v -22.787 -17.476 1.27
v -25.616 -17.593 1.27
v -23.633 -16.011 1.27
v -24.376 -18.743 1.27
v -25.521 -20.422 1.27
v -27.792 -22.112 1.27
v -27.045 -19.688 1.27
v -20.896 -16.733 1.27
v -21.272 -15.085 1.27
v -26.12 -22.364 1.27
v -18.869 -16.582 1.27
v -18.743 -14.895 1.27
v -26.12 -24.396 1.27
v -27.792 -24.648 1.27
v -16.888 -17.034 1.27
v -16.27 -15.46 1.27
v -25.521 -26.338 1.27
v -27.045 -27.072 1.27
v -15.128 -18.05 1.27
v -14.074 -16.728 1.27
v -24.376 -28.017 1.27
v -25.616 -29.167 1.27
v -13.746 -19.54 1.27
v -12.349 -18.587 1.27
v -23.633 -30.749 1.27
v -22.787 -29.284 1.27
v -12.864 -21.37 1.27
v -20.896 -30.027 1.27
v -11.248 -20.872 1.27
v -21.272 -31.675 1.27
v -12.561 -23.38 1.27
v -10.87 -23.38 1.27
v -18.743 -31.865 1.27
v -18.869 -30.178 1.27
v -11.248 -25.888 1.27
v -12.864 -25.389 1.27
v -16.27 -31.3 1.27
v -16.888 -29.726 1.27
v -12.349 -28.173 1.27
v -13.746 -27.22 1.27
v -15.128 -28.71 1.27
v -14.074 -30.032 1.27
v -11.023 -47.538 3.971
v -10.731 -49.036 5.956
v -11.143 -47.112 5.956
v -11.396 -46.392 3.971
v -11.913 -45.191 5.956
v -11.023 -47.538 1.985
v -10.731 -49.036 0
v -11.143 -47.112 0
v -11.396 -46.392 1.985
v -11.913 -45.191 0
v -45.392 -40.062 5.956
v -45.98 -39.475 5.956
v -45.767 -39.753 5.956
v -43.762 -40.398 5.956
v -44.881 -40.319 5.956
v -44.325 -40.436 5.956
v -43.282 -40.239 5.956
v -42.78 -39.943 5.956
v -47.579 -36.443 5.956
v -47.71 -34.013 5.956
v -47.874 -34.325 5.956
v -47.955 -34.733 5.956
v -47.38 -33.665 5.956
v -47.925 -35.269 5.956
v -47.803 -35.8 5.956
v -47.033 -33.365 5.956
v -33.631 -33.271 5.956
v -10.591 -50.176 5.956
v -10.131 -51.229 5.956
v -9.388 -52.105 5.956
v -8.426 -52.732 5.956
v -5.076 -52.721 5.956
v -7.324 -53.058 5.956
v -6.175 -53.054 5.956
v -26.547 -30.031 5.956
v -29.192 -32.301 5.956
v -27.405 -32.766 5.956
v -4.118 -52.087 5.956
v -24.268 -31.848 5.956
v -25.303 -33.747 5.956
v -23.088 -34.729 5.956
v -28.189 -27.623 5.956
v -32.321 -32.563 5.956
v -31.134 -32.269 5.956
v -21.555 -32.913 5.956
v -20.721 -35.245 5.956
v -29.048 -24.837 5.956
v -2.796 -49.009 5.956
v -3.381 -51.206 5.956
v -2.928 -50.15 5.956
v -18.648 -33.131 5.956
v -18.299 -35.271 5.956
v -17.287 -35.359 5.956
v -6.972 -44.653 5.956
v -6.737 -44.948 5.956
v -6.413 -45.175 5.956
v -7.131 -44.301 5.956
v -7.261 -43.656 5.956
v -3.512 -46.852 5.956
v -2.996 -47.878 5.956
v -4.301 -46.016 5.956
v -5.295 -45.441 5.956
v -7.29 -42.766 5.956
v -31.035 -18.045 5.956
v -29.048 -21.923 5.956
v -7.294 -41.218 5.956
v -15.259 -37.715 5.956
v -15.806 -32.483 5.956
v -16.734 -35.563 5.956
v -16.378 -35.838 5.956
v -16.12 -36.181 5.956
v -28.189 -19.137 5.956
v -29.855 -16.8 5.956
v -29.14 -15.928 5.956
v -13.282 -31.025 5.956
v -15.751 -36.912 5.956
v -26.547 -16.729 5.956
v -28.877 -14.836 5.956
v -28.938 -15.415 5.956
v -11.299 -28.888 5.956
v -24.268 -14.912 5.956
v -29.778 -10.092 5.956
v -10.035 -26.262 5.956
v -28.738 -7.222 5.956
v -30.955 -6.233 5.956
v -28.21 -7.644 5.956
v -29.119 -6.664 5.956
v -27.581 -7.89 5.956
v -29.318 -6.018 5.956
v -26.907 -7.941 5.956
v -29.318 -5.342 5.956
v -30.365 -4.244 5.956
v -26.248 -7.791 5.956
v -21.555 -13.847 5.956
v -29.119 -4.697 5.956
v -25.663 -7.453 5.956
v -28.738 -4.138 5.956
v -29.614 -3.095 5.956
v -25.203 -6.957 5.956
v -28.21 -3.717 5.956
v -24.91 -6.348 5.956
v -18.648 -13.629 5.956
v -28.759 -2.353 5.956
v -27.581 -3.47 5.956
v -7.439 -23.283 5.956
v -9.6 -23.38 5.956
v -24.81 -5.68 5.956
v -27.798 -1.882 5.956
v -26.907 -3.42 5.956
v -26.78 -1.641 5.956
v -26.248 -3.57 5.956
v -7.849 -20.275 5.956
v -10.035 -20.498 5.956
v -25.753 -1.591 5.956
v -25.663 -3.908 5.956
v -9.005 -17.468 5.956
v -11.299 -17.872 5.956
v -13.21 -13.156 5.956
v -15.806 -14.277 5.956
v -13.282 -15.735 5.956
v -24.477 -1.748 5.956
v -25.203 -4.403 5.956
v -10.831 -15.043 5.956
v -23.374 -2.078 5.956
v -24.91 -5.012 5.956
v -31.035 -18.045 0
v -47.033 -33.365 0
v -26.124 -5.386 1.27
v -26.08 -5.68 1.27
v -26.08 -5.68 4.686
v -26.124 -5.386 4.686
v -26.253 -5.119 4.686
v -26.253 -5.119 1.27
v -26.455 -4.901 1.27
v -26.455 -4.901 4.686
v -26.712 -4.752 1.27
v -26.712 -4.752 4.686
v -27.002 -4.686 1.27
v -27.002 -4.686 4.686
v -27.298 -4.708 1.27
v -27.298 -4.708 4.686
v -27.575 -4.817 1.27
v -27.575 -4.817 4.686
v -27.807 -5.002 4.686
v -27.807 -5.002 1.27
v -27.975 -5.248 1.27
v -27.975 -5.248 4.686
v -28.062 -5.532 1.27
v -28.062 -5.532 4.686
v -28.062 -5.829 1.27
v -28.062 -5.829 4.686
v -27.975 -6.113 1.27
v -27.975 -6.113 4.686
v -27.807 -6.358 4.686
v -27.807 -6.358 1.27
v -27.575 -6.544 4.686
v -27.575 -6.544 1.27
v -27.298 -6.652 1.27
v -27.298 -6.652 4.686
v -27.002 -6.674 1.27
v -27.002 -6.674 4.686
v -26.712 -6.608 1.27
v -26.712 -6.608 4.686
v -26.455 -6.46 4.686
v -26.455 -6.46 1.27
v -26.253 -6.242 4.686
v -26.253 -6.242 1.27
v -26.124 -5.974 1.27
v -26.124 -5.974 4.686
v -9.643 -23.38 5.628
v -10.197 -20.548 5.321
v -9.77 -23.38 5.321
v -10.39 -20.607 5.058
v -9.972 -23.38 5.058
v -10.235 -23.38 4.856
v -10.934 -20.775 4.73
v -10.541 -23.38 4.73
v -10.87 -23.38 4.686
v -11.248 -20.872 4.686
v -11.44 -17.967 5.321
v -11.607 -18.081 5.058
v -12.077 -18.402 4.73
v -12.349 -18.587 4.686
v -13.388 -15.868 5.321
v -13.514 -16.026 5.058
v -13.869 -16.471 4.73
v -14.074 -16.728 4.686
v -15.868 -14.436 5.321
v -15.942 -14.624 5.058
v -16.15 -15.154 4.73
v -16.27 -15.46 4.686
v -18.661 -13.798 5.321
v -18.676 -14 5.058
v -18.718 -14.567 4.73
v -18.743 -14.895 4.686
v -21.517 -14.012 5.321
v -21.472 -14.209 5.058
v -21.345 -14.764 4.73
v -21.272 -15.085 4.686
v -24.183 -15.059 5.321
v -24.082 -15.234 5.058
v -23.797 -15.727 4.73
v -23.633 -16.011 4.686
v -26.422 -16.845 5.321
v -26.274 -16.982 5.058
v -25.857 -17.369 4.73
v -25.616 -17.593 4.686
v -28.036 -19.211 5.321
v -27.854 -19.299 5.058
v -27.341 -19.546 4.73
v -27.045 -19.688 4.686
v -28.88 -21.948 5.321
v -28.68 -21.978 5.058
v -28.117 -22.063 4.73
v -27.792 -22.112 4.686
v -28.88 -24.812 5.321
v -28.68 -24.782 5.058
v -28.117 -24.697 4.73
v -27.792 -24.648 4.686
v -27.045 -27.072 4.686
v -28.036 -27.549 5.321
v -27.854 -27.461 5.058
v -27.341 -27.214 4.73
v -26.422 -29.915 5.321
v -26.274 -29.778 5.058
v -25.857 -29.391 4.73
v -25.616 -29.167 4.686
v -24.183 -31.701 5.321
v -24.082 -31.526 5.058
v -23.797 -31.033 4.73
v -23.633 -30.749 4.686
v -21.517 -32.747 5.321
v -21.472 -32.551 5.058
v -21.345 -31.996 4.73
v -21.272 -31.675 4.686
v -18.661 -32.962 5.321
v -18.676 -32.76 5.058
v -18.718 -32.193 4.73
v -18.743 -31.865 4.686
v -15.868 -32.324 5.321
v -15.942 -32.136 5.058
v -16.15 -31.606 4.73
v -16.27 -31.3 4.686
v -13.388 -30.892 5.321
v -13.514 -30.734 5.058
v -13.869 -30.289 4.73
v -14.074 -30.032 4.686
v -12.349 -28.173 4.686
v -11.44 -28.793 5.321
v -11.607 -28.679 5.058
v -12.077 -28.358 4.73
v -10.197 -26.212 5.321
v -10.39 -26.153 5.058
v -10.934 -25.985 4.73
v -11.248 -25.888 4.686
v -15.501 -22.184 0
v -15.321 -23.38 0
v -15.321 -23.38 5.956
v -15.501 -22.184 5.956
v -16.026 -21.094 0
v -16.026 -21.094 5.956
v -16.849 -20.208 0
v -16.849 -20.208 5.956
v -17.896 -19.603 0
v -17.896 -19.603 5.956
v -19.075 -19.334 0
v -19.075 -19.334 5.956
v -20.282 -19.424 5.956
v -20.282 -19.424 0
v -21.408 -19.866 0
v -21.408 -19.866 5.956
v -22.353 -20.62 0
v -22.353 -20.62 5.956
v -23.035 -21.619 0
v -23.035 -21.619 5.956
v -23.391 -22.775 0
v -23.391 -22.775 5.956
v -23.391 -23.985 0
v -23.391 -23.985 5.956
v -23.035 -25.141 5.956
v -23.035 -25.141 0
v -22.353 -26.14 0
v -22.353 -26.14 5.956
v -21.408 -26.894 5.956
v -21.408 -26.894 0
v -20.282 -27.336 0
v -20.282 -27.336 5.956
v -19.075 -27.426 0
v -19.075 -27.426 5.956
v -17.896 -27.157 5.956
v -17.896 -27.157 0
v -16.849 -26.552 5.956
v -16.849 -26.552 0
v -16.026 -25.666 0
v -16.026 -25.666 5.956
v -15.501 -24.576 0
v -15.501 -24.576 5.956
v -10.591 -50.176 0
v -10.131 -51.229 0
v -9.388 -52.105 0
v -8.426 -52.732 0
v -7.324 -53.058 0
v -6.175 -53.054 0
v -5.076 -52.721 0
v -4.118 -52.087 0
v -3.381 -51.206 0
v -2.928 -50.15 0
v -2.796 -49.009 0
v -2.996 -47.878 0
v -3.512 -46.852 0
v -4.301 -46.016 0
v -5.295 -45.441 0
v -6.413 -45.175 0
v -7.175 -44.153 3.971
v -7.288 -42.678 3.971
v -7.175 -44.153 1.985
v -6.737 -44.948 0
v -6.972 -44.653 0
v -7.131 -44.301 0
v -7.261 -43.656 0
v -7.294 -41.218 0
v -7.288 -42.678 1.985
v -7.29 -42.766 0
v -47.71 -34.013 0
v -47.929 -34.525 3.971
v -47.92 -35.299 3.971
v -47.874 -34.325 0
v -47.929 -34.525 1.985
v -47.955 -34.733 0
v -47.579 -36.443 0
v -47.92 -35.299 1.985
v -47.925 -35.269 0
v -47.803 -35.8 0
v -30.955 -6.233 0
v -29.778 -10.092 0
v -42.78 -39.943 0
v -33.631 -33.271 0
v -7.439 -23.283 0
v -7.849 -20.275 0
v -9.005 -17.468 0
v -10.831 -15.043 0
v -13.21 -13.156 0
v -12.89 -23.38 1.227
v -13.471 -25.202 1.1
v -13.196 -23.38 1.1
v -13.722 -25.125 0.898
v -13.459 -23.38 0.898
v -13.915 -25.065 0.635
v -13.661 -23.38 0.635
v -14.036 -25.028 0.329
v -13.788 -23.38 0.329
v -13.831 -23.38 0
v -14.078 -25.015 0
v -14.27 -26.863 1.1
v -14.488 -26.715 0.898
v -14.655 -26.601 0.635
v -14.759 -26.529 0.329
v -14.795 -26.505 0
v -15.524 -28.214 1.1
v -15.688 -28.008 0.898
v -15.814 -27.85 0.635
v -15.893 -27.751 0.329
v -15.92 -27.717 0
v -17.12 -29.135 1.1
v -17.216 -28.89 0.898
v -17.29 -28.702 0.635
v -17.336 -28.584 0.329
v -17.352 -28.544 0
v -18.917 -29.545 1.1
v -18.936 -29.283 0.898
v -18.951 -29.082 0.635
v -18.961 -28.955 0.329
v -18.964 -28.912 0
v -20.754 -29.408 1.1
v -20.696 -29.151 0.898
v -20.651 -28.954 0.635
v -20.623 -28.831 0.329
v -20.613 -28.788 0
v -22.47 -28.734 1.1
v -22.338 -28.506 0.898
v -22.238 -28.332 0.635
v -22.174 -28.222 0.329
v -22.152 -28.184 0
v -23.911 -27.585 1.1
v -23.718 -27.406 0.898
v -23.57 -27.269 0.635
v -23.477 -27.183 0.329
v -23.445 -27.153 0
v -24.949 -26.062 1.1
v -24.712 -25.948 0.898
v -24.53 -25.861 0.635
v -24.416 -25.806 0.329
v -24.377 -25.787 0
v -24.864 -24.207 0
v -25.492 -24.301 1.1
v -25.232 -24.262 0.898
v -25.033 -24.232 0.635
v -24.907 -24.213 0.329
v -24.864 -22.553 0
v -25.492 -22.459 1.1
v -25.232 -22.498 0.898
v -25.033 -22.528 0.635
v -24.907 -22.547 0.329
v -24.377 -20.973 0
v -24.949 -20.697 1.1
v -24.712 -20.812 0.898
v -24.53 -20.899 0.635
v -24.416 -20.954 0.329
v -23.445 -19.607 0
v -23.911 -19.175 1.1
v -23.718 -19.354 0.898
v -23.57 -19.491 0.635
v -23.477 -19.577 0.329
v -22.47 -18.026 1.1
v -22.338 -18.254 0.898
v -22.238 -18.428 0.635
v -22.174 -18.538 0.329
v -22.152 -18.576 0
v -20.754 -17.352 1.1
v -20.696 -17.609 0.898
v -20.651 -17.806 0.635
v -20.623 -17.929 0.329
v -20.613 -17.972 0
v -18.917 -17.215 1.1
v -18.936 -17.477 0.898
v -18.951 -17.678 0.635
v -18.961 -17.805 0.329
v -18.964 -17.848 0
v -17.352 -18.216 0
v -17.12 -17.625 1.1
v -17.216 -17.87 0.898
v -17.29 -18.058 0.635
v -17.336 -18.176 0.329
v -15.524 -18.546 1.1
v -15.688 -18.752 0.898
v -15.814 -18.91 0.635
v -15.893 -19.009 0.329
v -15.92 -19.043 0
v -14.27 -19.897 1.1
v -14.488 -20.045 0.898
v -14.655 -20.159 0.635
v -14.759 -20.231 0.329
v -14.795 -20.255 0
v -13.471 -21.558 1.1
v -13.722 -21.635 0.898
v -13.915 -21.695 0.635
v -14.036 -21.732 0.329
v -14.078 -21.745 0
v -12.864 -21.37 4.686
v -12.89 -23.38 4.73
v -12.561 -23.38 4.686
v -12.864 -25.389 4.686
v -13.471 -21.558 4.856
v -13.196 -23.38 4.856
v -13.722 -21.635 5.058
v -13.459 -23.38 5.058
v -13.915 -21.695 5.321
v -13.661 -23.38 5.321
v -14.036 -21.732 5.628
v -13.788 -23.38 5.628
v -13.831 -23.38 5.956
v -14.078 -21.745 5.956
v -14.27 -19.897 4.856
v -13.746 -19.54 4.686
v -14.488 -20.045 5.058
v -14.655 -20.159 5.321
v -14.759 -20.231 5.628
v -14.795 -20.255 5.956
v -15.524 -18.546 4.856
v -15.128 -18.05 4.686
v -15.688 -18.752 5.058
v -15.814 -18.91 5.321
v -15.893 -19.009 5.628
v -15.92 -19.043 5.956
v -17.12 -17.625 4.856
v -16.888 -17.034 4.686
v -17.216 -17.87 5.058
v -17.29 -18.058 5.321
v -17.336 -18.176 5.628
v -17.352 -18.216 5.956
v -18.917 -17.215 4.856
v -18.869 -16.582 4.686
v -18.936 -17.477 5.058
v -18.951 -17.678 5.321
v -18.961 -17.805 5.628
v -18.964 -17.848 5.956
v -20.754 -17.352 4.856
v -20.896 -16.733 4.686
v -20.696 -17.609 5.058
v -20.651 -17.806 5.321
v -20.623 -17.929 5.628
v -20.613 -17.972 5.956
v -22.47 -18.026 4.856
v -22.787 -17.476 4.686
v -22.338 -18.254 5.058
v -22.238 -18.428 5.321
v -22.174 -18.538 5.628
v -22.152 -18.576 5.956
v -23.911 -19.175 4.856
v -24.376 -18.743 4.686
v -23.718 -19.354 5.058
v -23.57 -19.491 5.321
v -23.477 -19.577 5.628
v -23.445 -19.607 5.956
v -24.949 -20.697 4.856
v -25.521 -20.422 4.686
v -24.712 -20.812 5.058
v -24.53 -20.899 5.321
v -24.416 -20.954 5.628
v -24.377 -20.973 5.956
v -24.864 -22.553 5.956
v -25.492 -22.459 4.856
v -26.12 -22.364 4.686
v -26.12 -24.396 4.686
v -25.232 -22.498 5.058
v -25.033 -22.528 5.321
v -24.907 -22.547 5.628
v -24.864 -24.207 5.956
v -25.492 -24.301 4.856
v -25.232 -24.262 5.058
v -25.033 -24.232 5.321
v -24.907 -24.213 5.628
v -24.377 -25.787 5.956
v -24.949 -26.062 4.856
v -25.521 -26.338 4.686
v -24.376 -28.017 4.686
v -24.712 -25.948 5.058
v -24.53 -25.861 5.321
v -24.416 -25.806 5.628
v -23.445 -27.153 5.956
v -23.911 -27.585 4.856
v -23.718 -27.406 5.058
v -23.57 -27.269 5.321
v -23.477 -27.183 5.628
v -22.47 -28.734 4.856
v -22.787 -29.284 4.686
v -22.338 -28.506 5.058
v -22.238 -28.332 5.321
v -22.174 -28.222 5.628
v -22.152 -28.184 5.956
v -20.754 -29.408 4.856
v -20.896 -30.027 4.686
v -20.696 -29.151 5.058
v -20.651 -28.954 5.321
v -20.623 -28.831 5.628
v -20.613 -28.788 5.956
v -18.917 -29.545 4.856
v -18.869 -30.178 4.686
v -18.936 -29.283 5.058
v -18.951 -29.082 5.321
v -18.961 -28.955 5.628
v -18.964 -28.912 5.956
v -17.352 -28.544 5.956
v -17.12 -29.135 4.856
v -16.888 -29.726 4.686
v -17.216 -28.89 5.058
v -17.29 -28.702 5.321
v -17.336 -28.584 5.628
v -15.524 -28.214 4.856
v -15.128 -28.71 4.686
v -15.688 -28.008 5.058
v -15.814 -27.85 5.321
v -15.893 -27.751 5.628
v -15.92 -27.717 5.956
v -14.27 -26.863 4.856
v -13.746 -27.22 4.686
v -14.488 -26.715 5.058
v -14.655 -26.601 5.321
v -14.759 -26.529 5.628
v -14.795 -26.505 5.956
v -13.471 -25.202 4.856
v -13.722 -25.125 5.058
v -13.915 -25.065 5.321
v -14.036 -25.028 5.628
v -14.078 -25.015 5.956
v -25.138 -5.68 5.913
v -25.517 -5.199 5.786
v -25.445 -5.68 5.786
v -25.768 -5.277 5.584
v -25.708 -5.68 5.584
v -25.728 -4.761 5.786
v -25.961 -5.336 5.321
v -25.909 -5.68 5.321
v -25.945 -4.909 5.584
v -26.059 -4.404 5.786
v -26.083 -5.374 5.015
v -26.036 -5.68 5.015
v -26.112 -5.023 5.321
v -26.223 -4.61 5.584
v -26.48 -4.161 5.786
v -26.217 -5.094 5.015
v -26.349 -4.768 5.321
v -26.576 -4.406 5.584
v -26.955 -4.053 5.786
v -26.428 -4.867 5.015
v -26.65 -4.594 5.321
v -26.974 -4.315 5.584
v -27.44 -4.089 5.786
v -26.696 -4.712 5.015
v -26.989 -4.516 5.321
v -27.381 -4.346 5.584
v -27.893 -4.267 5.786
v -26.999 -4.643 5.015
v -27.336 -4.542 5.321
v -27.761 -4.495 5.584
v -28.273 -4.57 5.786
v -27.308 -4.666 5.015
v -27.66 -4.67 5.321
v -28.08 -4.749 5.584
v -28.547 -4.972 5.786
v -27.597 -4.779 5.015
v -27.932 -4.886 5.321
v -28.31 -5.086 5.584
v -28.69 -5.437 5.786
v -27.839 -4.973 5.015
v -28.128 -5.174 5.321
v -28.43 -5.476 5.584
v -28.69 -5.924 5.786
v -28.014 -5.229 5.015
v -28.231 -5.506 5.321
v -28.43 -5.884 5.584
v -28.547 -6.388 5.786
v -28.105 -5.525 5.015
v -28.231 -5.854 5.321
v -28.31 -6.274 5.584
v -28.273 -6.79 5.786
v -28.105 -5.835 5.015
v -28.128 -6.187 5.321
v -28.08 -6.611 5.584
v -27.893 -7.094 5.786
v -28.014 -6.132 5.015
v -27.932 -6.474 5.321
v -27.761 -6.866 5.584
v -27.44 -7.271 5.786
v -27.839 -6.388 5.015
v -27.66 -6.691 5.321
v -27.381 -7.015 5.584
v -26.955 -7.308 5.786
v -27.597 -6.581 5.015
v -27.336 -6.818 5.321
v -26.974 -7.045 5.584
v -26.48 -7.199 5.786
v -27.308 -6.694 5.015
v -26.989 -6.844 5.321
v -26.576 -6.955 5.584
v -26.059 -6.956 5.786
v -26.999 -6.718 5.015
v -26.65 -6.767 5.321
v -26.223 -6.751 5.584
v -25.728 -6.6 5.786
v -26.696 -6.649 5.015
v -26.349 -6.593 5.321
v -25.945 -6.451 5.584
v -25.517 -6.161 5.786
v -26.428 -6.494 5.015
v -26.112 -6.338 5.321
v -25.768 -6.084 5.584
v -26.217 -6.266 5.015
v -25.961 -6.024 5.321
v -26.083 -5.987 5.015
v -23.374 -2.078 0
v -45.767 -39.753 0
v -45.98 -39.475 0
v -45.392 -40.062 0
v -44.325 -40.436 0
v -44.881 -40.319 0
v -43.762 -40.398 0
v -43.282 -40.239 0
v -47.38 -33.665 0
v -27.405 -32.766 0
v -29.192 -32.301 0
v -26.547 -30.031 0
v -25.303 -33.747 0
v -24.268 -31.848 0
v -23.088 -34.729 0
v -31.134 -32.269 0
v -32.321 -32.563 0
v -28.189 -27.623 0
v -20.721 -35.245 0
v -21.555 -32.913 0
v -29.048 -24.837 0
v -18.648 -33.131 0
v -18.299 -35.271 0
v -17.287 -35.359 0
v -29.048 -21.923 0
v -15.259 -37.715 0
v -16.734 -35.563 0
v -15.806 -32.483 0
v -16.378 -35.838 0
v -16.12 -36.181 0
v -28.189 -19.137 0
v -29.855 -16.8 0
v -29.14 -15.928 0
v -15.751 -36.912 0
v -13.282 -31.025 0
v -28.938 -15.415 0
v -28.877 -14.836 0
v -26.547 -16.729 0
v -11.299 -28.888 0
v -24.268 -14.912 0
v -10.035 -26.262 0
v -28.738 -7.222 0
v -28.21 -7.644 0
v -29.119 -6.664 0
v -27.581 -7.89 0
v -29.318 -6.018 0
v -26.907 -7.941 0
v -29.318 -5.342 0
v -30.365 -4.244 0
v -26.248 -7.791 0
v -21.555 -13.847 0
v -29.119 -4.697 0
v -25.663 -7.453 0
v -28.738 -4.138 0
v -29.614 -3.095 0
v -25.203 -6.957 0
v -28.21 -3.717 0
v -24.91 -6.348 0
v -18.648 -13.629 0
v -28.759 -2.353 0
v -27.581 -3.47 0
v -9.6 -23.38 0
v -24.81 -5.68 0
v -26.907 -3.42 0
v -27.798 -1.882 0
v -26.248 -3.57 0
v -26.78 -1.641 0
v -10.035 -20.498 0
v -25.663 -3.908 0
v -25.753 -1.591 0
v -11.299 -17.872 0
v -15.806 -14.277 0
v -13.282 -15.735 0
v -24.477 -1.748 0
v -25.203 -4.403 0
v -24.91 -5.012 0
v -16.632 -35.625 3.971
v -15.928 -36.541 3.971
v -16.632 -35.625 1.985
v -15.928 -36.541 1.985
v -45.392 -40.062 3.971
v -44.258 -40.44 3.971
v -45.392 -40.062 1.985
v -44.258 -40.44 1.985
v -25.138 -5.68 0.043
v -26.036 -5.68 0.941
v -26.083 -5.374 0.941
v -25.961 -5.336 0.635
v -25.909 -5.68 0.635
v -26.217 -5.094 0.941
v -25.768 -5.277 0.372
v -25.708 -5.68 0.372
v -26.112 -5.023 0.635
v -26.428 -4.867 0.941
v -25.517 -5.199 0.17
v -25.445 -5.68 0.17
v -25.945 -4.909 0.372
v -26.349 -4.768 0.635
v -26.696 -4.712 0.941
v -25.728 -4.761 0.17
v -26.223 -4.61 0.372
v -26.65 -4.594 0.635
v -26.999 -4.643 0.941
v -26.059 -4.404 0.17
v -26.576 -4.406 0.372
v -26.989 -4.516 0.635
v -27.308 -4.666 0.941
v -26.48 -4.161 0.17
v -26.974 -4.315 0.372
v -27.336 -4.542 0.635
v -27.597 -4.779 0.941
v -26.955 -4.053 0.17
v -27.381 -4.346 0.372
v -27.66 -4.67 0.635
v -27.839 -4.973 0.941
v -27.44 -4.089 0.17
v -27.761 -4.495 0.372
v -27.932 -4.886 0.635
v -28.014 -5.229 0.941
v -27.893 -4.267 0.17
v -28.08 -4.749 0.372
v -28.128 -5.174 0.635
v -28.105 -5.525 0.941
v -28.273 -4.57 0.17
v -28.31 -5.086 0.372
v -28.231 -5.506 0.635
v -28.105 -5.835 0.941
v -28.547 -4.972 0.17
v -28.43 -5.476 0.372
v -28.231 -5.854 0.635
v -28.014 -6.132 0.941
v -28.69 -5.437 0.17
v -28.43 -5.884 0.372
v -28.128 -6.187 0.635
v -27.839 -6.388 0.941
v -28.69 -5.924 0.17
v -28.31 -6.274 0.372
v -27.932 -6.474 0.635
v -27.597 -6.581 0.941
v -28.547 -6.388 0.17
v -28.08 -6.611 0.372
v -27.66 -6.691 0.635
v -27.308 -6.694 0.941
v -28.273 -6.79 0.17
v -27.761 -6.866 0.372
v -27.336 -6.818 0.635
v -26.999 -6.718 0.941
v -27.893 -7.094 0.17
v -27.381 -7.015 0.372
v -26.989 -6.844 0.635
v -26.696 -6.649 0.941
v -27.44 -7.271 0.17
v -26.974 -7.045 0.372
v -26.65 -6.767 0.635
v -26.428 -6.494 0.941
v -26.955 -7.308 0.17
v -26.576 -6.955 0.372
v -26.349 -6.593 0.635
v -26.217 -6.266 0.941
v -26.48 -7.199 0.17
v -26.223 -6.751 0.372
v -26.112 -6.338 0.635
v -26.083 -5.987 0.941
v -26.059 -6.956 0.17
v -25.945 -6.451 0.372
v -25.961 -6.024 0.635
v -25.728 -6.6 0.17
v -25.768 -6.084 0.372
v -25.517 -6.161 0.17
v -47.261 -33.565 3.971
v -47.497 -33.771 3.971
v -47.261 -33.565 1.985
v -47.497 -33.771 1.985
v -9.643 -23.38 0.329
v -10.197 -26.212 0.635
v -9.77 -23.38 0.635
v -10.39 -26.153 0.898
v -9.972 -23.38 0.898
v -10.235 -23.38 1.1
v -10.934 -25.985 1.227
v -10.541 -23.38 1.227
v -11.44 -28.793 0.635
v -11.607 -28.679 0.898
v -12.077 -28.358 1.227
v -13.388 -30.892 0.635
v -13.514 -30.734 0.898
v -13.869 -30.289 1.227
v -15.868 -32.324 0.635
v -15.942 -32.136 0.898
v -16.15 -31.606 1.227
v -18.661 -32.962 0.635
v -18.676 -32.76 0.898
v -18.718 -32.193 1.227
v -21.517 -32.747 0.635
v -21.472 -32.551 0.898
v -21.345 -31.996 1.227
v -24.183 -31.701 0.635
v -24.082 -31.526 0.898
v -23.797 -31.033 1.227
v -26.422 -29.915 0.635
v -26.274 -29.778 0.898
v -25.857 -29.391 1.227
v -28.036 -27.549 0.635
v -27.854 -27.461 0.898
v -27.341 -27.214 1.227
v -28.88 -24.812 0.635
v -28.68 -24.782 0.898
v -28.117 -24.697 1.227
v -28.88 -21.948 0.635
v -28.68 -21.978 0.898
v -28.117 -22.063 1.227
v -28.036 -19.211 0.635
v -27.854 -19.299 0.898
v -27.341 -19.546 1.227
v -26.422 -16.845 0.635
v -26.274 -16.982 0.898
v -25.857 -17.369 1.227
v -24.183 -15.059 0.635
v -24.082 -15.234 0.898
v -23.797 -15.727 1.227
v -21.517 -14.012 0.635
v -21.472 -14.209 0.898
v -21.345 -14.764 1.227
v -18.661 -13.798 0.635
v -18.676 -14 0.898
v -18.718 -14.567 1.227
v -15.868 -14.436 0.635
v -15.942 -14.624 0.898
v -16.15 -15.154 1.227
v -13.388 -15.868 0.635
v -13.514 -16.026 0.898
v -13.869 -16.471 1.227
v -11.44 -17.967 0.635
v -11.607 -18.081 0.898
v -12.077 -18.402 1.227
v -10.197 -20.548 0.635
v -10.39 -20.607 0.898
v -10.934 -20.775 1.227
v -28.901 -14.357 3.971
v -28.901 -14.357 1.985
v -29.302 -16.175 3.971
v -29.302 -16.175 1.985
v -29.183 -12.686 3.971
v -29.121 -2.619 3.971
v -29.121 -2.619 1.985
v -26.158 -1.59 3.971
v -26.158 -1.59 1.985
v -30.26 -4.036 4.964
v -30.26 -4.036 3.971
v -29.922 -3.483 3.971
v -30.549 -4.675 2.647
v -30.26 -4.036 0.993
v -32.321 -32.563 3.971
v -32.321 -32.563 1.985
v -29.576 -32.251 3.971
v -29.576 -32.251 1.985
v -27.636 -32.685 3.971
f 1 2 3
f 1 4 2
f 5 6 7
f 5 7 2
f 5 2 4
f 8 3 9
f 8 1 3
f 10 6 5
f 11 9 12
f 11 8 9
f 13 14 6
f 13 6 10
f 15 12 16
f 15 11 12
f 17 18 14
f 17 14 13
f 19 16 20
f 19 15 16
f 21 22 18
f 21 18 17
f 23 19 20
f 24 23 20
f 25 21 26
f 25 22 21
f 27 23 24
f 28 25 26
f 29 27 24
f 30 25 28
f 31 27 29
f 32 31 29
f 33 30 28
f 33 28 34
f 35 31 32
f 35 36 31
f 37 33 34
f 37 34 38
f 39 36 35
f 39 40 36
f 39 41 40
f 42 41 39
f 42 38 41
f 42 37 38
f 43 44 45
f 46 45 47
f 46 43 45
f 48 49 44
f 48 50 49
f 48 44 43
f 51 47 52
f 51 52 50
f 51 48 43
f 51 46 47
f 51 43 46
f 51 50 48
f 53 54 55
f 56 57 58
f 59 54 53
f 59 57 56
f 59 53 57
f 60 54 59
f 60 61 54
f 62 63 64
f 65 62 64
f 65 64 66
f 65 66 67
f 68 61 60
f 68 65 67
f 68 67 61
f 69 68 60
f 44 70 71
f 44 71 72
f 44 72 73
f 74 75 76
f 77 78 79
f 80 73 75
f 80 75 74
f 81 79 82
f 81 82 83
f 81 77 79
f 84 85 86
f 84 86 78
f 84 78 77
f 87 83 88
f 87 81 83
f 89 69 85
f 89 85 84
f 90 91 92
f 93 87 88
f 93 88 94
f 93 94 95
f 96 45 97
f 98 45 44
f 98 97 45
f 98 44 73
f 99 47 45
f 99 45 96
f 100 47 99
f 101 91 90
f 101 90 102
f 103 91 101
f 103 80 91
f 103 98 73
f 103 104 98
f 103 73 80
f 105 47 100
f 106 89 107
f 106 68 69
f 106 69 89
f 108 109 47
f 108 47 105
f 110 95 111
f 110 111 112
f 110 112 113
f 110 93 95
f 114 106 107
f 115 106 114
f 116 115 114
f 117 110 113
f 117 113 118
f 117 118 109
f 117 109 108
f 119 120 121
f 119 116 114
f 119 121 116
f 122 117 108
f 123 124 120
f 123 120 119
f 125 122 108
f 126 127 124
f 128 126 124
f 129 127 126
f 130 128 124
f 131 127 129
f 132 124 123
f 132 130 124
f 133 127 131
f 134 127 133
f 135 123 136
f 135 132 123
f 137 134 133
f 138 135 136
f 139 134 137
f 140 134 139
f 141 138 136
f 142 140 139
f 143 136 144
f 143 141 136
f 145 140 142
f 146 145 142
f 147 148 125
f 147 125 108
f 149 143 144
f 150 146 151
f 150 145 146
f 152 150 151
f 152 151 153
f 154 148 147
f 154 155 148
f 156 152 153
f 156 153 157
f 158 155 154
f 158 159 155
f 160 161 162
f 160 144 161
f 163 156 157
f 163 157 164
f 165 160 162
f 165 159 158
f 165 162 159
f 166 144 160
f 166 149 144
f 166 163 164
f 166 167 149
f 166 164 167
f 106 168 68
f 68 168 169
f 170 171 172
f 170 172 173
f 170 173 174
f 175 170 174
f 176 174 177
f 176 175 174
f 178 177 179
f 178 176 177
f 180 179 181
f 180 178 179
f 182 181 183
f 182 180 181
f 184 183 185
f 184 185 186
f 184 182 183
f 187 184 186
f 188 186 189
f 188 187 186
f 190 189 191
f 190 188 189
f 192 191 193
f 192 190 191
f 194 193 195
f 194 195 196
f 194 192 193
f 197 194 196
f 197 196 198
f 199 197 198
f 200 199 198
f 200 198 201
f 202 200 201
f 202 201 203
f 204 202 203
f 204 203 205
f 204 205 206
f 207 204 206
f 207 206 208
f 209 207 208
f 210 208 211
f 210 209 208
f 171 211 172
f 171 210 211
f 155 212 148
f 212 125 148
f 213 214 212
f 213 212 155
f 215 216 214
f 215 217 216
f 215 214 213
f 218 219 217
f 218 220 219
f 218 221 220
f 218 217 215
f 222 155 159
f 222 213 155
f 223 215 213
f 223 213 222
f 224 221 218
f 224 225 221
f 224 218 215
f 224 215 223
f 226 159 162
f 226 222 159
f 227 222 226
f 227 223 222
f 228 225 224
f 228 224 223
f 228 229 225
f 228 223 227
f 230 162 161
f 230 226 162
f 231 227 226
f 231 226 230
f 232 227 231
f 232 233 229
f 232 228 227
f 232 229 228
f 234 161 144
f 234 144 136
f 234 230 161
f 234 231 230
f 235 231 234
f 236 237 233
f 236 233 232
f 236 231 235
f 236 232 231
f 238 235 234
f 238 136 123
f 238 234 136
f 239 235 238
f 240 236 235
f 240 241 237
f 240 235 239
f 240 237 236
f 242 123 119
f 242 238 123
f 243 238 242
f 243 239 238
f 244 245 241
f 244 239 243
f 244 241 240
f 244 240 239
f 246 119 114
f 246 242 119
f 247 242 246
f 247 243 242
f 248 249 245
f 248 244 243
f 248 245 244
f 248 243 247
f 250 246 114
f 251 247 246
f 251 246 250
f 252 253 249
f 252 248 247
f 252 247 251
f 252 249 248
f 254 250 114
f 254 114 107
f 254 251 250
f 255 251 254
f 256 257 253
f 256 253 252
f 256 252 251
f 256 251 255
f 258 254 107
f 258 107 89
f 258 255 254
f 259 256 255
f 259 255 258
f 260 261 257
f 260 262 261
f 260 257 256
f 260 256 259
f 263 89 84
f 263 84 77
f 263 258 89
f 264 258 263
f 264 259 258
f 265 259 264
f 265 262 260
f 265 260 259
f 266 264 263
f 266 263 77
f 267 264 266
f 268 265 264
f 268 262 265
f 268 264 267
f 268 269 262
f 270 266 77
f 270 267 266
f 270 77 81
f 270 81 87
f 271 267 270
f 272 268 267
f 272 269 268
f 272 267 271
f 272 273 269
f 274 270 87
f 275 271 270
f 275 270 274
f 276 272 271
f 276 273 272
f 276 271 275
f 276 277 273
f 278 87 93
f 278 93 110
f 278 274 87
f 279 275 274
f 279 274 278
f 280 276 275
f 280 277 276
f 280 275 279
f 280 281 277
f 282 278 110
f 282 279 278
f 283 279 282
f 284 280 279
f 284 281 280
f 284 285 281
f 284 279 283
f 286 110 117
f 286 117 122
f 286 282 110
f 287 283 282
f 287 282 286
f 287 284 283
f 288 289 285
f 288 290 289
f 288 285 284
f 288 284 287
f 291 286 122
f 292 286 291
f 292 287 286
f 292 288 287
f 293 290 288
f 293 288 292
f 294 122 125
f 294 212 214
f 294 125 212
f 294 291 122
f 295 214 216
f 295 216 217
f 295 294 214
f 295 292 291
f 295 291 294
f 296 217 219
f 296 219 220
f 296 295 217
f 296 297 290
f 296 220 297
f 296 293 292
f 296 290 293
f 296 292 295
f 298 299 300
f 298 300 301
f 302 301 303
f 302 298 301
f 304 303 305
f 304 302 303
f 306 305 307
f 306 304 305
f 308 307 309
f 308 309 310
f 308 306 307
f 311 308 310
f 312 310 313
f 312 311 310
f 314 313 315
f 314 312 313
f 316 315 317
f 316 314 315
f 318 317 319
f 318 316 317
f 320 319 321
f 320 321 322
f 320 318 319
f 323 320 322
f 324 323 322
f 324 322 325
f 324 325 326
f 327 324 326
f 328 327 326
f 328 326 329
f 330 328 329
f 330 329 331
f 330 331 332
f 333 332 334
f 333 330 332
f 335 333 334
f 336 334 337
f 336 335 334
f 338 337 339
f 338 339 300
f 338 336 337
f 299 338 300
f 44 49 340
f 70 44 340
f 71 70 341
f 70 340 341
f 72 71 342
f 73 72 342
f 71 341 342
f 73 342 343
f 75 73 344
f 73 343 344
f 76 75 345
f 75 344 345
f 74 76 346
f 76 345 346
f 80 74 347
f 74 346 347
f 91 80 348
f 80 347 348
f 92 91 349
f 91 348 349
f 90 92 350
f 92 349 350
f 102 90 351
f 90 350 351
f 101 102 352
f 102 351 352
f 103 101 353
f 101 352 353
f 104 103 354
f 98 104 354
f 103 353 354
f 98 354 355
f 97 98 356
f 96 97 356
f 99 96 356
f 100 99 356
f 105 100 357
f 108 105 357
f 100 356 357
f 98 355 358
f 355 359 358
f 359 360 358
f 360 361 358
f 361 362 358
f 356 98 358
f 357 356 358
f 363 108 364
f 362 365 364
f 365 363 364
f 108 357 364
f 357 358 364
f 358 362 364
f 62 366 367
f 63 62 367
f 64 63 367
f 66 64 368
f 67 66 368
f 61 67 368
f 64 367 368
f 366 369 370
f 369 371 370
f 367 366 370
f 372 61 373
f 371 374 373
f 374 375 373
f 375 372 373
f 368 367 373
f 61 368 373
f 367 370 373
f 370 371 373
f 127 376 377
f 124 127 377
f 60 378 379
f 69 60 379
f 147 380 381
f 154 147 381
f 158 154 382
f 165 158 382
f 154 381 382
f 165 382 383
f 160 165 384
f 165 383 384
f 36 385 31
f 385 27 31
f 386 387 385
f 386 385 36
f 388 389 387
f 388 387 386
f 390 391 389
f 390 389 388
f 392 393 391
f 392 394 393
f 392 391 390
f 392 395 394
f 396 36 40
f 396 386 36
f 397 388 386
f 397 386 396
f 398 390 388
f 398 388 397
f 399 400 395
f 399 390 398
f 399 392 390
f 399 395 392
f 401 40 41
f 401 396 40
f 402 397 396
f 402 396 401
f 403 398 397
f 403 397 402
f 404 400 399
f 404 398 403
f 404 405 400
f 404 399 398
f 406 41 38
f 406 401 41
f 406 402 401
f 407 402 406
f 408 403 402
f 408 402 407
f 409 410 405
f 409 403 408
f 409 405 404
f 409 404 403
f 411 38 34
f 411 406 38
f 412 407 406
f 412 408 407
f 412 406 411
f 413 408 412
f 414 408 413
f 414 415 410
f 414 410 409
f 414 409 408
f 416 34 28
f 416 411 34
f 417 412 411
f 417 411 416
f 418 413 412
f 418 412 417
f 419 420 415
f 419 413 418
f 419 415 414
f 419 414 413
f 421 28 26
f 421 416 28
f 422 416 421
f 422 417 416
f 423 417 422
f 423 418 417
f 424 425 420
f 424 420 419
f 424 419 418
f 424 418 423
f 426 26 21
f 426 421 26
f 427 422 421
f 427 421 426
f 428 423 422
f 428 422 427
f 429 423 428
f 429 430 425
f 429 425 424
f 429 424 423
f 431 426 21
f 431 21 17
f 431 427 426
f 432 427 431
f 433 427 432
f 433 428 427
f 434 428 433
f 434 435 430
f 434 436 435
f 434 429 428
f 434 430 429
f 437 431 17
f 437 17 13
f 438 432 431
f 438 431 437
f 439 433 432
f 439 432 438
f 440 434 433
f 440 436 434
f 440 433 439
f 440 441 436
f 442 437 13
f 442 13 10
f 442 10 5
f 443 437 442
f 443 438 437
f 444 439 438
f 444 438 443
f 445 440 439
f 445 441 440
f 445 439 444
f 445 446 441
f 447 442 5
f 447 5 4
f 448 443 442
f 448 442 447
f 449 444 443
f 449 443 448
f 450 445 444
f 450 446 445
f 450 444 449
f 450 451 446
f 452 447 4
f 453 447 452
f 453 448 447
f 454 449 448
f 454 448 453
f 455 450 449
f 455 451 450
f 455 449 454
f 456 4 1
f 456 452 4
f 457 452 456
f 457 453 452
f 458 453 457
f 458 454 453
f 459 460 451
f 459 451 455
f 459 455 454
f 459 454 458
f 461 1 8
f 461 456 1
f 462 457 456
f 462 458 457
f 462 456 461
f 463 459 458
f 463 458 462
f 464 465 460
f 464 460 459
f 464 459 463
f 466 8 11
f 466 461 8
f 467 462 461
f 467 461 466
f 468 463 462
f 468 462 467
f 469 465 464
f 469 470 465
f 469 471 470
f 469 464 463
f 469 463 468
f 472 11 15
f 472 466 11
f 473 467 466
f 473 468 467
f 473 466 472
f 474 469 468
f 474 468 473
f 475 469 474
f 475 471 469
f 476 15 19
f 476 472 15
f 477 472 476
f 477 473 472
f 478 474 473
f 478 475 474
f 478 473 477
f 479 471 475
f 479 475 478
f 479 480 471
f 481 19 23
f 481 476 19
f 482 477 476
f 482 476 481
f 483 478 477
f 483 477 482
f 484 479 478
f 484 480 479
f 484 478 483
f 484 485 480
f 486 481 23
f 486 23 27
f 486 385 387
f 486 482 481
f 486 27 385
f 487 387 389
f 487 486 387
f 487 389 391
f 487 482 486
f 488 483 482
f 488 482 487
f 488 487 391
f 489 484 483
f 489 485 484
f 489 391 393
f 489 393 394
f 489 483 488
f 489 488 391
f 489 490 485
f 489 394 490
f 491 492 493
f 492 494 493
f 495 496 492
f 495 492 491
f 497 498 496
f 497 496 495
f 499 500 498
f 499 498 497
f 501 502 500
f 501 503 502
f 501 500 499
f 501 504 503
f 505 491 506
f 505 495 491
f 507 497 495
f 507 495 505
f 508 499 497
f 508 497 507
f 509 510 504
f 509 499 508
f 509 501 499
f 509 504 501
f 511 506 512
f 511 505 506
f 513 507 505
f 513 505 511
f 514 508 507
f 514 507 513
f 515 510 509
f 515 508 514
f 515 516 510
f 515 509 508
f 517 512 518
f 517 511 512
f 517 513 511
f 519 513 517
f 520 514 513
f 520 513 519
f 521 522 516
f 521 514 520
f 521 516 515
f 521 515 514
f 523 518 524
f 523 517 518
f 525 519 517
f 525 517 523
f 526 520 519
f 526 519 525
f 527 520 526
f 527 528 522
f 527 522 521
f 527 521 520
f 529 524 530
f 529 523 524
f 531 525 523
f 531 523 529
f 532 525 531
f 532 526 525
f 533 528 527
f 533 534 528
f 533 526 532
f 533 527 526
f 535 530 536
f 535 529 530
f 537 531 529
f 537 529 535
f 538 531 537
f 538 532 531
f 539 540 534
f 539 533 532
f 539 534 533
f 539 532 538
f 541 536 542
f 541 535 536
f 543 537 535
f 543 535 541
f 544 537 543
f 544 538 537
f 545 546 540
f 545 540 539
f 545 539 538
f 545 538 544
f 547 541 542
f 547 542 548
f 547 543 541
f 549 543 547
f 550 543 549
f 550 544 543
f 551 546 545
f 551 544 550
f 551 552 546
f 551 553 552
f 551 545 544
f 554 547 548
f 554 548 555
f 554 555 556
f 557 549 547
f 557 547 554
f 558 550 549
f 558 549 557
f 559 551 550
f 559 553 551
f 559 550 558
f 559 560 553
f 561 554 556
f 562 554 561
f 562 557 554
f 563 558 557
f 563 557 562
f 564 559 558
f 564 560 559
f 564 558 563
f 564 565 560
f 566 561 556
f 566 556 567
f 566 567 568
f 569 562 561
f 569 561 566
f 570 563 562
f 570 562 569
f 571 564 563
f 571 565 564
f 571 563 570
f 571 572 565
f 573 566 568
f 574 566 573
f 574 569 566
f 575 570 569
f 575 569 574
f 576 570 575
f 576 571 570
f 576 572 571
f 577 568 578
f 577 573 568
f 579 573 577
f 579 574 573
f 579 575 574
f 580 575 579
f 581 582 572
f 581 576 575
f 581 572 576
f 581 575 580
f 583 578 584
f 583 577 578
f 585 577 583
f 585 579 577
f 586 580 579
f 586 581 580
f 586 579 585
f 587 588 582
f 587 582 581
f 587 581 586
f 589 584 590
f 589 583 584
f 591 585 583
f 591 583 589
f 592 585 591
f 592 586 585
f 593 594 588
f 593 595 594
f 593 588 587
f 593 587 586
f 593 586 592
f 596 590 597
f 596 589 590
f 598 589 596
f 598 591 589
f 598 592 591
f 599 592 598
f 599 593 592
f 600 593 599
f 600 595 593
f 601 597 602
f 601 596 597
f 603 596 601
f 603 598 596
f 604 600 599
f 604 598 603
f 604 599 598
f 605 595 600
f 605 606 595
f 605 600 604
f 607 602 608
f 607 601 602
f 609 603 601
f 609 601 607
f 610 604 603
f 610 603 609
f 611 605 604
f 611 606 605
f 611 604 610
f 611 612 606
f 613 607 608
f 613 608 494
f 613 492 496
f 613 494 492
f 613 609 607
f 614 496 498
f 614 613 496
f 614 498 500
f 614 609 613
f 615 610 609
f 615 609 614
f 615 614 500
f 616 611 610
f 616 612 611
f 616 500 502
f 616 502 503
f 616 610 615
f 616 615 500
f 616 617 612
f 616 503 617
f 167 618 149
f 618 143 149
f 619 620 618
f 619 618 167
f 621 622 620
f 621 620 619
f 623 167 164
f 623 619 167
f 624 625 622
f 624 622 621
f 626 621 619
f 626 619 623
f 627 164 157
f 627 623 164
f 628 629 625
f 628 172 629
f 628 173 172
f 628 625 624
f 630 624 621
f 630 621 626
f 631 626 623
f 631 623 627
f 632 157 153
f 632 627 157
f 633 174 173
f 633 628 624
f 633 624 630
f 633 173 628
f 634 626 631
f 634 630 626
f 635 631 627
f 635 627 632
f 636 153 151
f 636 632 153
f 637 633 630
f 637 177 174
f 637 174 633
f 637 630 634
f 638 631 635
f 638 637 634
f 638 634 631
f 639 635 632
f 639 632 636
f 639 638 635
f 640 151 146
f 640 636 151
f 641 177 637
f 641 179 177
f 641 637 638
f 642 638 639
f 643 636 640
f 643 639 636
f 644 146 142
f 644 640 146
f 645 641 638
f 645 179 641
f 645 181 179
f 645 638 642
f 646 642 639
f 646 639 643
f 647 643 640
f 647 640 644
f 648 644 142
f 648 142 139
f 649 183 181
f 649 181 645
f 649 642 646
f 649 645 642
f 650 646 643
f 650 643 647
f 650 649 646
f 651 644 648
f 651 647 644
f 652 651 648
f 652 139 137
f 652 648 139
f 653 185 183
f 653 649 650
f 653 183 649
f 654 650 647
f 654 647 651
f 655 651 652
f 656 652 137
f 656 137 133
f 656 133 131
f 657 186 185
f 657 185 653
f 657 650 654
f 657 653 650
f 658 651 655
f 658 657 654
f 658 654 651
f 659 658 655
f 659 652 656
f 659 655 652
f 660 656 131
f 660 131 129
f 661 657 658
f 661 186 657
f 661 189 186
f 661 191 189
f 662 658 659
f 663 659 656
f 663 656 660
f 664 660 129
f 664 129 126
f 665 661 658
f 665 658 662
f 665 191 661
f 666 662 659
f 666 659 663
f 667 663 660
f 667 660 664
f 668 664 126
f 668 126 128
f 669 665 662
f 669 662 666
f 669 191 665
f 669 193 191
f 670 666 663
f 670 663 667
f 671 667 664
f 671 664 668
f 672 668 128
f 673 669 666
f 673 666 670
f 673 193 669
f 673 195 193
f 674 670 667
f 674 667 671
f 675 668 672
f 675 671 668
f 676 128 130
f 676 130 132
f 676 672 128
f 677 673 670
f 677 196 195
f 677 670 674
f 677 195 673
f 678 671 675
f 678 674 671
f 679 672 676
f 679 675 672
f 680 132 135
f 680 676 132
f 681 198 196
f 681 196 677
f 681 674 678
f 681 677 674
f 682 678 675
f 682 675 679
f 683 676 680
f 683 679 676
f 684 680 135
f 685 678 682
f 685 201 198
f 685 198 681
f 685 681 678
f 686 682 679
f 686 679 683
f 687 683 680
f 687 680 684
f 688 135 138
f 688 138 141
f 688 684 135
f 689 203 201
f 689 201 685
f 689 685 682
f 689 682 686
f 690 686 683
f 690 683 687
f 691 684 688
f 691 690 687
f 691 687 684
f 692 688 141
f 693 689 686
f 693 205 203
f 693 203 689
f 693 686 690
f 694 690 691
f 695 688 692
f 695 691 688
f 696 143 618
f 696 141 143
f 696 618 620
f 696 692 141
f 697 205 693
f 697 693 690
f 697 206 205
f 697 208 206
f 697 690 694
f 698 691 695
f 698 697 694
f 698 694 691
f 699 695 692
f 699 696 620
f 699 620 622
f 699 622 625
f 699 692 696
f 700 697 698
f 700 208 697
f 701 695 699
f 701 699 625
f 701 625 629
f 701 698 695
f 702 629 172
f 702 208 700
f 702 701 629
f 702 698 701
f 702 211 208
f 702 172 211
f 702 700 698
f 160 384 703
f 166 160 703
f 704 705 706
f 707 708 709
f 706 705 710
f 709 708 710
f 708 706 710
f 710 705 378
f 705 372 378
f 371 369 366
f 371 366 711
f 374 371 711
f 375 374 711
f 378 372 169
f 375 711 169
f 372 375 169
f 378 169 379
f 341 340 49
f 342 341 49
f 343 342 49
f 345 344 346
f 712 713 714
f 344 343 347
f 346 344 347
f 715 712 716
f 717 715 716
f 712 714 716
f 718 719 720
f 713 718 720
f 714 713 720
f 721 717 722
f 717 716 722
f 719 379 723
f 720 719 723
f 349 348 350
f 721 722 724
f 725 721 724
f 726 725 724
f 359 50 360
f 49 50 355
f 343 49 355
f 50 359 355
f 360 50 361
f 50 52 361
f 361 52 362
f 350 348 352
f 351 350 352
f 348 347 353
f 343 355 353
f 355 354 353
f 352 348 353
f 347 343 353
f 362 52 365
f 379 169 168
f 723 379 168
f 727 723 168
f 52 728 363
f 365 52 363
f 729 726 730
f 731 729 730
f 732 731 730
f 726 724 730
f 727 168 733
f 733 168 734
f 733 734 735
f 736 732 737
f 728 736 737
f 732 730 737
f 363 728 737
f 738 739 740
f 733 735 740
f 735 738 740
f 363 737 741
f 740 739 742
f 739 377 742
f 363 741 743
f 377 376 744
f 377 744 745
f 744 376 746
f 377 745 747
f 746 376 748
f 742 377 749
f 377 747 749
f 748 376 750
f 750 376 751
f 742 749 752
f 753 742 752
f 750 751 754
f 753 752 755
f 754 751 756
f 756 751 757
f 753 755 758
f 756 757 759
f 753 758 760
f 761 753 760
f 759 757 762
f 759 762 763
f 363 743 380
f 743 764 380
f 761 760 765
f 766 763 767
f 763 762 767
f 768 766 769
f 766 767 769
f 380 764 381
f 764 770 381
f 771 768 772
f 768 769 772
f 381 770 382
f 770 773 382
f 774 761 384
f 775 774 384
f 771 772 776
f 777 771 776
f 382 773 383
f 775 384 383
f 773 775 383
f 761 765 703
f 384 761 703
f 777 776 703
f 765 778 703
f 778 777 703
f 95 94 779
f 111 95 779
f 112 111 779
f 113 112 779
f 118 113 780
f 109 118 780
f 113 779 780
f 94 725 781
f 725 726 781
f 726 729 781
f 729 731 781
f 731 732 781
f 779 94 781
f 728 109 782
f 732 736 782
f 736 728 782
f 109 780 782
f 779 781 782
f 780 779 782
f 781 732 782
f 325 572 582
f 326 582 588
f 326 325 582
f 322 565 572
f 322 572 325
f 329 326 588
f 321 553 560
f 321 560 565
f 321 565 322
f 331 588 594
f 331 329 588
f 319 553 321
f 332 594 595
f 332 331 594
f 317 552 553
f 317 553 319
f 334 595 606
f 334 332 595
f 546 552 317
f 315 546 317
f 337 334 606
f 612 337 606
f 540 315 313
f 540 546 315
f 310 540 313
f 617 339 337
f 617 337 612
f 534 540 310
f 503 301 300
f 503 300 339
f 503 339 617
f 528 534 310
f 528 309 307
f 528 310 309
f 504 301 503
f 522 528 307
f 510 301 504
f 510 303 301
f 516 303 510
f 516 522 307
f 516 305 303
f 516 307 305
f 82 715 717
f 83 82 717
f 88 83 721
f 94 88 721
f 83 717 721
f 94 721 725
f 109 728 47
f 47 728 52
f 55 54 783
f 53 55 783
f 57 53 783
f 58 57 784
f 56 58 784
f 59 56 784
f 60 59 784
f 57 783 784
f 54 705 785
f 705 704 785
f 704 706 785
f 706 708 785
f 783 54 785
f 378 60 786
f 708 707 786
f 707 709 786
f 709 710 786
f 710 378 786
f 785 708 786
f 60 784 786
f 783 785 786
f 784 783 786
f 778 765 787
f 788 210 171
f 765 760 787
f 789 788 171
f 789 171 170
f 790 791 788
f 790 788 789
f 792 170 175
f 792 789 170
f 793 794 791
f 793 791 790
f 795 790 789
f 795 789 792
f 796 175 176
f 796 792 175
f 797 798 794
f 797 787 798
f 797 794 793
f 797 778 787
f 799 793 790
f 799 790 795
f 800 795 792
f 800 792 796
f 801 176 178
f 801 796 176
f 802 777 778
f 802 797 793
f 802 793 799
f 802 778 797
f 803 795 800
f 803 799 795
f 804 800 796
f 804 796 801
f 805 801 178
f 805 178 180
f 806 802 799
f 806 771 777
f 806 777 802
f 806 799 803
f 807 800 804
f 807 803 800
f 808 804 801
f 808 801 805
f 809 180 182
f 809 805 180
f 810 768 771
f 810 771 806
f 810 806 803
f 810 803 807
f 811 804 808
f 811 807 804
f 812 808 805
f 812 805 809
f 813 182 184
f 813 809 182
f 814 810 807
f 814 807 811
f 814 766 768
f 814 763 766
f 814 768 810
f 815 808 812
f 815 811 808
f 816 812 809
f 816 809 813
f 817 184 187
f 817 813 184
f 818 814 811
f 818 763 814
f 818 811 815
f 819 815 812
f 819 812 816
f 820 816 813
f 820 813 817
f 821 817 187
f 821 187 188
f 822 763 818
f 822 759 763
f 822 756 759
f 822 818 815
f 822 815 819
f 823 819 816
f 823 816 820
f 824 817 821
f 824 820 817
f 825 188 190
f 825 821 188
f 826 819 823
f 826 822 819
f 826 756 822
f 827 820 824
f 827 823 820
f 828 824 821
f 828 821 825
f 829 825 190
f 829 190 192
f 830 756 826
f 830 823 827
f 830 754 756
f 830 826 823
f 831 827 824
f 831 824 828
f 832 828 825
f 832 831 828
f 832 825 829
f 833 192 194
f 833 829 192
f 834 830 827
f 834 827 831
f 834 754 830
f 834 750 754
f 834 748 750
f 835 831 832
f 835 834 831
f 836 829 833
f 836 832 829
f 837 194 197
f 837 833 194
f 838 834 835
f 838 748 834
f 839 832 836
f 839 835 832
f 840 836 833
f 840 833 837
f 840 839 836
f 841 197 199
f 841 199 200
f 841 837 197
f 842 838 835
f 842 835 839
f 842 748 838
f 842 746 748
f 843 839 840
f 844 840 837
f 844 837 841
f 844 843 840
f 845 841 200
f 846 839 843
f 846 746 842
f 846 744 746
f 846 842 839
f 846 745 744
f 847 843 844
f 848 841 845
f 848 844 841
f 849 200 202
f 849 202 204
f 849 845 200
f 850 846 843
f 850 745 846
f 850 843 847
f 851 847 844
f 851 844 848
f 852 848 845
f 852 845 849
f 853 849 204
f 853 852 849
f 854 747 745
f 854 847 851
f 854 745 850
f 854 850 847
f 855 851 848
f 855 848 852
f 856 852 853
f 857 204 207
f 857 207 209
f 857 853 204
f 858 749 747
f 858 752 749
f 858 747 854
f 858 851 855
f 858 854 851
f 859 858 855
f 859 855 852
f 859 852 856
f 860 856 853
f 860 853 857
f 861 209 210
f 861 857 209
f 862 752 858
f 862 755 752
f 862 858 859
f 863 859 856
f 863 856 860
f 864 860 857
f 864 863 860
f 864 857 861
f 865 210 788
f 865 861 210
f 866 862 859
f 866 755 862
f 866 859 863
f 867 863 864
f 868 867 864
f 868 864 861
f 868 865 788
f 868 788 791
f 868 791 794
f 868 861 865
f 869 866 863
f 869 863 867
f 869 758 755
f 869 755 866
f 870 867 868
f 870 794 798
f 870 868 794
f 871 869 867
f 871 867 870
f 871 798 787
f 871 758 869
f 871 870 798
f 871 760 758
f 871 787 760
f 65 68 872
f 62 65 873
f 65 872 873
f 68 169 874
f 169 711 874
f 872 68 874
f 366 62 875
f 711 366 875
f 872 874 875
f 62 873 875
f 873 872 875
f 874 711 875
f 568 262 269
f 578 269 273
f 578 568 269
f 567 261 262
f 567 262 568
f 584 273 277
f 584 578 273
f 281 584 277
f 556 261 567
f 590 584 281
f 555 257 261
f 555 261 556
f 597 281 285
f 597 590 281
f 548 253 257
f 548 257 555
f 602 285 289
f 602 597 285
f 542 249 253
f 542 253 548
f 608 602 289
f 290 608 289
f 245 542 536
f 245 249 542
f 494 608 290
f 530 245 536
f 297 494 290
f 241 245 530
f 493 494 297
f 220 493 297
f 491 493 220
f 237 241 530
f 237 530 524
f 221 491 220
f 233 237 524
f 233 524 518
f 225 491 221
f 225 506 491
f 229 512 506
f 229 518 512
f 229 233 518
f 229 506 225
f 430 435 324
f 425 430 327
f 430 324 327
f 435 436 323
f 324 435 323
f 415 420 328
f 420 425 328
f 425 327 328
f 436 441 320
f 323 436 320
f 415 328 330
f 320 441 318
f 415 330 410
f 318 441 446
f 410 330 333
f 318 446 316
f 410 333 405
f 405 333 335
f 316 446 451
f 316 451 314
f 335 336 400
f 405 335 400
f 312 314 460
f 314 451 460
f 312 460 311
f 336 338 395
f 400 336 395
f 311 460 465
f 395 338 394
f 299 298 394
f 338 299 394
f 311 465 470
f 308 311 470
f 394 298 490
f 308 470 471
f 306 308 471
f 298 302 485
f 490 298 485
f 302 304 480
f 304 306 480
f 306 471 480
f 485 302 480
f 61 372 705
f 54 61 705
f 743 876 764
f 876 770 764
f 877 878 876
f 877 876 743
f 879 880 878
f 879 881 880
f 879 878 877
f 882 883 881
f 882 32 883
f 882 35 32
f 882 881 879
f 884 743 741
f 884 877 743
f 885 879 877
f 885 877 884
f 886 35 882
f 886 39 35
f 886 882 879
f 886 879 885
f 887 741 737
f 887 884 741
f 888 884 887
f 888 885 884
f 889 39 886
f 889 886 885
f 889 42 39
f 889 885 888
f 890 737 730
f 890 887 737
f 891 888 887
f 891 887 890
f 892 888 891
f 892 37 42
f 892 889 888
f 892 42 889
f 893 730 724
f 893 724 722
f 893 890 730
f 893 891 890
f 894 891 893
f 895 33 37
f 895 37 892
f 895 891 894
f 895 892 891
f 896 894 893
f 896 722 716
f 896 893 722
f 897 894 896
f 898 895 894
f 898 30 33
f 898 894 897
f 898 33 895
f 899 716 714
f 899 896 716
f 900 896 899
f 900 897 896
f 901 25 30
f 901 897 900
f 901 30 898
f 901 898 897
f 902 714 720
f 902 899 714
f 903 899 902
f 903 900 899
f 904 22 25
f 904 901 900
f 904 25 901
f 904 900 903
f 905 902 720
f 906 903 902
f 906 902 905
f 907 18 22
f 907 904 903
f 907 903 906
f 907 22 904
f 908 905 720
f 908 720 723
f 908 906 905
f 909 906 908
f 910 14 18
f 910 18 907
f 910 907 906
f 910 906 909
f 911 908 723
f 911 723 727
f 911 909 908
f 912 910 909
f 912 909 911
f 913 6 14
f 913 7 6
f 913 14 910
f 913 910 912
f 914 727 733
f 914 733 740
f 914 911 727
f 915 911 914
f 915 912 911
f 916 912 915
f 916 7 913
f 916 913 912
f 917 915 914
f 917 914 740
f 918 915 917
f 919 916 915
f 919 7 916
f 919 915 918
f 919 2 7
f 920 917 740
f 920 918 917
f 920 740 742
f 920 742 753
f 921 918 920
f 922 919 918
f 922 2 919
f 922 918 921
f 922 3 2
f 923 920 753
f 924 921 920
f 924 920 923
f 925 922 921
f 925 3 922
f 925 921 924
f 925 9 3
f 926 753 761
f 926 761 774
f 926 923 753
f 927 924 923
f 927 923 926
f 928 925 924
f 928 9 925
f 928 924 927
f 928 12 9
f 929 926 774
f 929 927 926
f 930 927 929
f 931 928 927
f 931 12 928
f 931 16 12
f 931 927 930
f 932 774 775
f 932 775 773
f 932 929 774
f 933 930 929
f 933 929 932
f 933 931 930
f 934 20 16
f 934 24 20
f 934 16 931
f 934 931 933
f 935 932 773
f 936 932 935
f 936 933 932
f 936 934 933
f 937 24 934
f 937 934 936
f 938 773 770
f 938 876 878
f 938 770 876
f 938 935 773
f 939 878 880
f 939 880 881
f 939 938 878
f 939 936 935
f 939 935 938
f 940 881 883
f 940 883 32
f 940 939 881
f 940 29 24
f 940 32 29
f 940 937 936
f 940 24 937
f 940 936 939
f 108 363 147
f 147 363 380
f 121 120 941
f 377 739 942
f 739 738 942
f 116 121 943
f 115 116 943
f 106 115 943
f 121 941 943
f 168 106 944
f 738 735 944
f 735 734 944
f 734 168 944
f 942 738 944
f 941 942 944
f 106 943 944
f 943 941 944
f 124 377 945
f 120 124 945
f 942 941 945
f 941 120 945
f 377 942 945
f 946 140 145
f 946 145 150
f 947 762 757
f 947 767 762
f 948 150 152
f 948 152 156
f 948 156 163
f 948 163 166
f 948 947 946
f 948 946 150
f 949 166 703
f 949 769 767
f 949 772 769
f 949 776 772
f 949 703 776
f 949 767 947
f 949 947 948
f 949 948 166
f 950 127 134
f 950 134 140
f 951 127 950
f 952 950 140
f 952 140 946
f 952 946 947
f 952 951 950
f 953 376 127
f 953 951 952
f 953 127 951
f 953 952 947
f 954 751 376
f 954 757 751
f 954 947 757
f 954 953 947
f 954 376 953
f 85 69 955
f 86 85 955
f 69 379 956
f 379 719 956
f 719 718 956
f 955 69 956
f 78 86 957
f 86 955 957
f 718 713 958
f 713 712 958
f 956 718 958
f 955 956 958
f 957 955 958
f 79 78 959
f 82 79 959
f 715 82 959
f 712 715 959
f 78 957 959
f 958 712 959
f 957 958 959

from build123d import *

# Parameters (mm, degrees)
F0_R     = 0.99695
F0_R_2   = 4.05765
F1_DEPTH = 5.9563
F2_R     = 9.7785511171
F2_R_2   = 5.5475367741
F3_DEPTH = 1.27
F4_R     = 1.26999
F5_R     = 1.27
F6_R     = 9.7785511171
F6_R_2   = 5.5475367741
F7_DEPTH = 1.27
F8_R     = 1.26999


# Not quite as in the source:
# - a fillet or chamfer is up to 0.001 mm smaller than in the source, because OpenCascade refuses the exact size


with BuildPart() as f1:
    # F0 (on Top) → F1 (new body)
    with BuildSketch(Plane.XY):
        with BuildLine():
            add(Edge.make_bspline(
                [(-33.6314394073, -33.2714746118), (-33.0057731764, -32.8335108579), (-30.3724482656, -30.8783296496), (-25.3025401745, -33.7471177082)],
                knots=[0, 0, 0, 0, 8.3424695855, 8.3424695855, 8.3424695855, 8.3424695855], degree=3))
            ThreePointArc((-25.3025401746, -33.7471177082), (-21.9177791625, -35.0471350698), (-18.2988837725, -35.2712966298))
            add(Edge.make_bspline(
                [(-18.2988837725, -35.2712966298), (-15.8398840576, -35.2424271405), (-16.2213556468, -36.5139991045), (-15.2587701461, -37.7152030189)],
                knots=[0, 0, 0, 0, 3.9006370377, 3.9006370377, 3.9006370377, 3.9006370377], degree=3))
            Line((-15.2587701461, -37.7152030189), (-11.9133347475, -45.1914166357))
            add(Edge.make_bspline(
                [(-10.7306365161, -49.0358446052), (-11.0024214771, -47.2270805733), (-11.3035654868, -46.5540988301), (-11.9133347475, -45.1914166357)],
                knots=[0, 0, 0, 0, 4.0222383717, 4.0222383717, 4.0222383717, 4.0222383717], degree=3))
            ThreePointArc((-10.7306365161, -49.0358446052), (-4.1177013069, -52.0873777347), (-6.4129489899, -45.1754601574))
            add(Edge.make_bspline(
                [(-6.4129489899, -45.1754601574), (-7.6786461286, -44.535394758), (-7.1622622199, -42.5141267478), (-7.293581398, -41.2180098819)],
                knots=[0, 0, 0, 0, 4.0542479106, 4.0542479106, 4.0542479106, 4.0542479106], degree=3))
            Line((-7.293581398, -41.2180098819), (-7.4388593588, -23.2832715275))
            ThreePointArc((-7.4388593588, -23.2832715275), (-9.004936212, -17.4677824297), (-13.2103104288, -13.1564789315))
            Line((-13.2103104288, -13.1564789315), (-23.3741309494, -2.0778968465))
            add(Edge.make_bspline(
                [(-30.9548836637, -6.2331505183), (-30.120029344, -0.9692255704), (-25.6342329085, -1.1884529376), (-23.3741309494, -2.0778968465)],
                knots=[0, 0, 0, 0, 8.6448796864, 8.6448796864, 8.6448796864, 8.6448796864], degree=3))
            Line((-30.9548836637, -6.2331505183), (-29.7779418645, -10.0919786303))
            add(Edge.make_bspline(
                [(-29.7779418645, -10.0919786303), (-28.2792598009, -16.4127741009), (-28.6187601862, -15.316130835), (-31.0345571488, -18.0451795459)],
                knots=[0, 0, 0, 0, 8.0518623173, 8.0518623173, 8.0518623173, 8.0518623173], degree=3))
            Line((-31.0345571488, -18.0451795459), (-47.0327663969, -33.3645439807))
            Line((-47.0327663969, -33.3645439807), (-47.710090224, -34.0131272307))
            add(Edge.make_bspline(
                [(-47.710090224, -34.0131272307), (-48.0070644447, -34.4292653886), (-48.1220479631, -35.0776240912), (-47.5788922065, -36.4427563472)],
                knots=[1.2296227613, 1.2296227613, 1.2296227613, 1.2296227613, 3.1262829004, 3.1262829004, 3.1262829004, 3.1262829004], degree=3))
            Line((-47.5788922065, -36.4427563472), (-45.9802214515, -39.4747166527))
            add(Edge.make_bspline(
                [(-45.9802214515, -39.4747166527), (-45.7317184979, -39.9460151291), (-44.362995404, -41.0978011232), (-42.7799038589, -39.9432815611)],
                knots=[0, 0, 0, 0, 3.234437473, 3.234437473, 3.234437473, 3.234437473], degree=3))
            Line((-42.7799038589, -39.9432815611), (-33.6314394073, -33.2714746118))
        make_face()
        with Locations((-27.0765330642, -5.6802984327)):
            Circle(F0_R, mode=Mode.SUBTRACT)
        with Locations((-19.3787027653, -23.3799886397)):
            Circle(F0_R_2, mode=Mode.SUBTRACT)
        with BuildLine():
            add(Edge.make_bspline(
                [(-47.0327663969, -33.3645439807), (-47.2485361779, -33.5711580997), (-47.5175590194, -33.7433409151), (-47.710090224, -34.0131272307)],
                knots=[0, 0, 0, 0, 1.2296227613, 1.2296227613, 1.2296227613, 1.2296227613], degree=3))
            Line((-47.710090224, -34.0131272307), (-47.0327663969, -33.3645439807))
        make_face()
    extrude(amount=F1_DEPTH)

    # F2 (on face) → F3 (cut)
    with BuildSketch(Plane.XY.offset(5.9563)):
        with Locations((-19.3787027653, -23.3799886397)):
            Circle(F2_R)
        with Locations((-19.3787027653, -23.3799886397)):
            Circle(F2_R_2, mode=Mode.SUBTRACT)
    extrude(amount=-F3_DEPTH, mode=Mode.SUBTRACT)

    # F4 (radius 1.27 in the source; OpenCascade refuses exactly that, so slightly less here)
    f4_edges = [f1.edges().sort_by_distance(p)[0] for p in [
        (-29.157254, -23.379989, 4.6863),
        (-24.92624, -23.379989, 4.6863),
    ]]
    fillet(f4_edges, radius=F4_R)

    # F5
    f5_edges = [f1.edges().sort_by_distance(p)[0] for p in [
        (-28.073483, -5.680298, 5.9563),
        (-28.073483, -5.680298, 0),
    ]]
    fillet(f5_edges, radius=F5_R)

    # F6 (on face) → F7 (cut)
    with BuildSketch(Plane(origin=(0, 0, 0), x_dir=(1, 0, 0), z_dir=(0, 0, -1))):
        with Locations((-19.3787027653, 23.3799886397)):
            Circle(F6_R)
        with Locations((-19.3787027653, 23.3799886397)):
            Circle(F6_R_2, mode=Mode.SUBTRACT)
    extrude(amount=-F7_DEPTH, mode=Mode.SUBTRACT)

    # F8 (radius 1.27 in the source; OpenCascade refuses exactly that, so slightly less here)
    f8_edges = [f1.edges().sort_by_distance(p)[0] for p in [
        (-29.157254, -23.379989, 1.27),
        (-24.92624, -23.379989, 1.27),
    ]]
    fillet(f8_edges, radius=F8_R)


solid = f1.part
